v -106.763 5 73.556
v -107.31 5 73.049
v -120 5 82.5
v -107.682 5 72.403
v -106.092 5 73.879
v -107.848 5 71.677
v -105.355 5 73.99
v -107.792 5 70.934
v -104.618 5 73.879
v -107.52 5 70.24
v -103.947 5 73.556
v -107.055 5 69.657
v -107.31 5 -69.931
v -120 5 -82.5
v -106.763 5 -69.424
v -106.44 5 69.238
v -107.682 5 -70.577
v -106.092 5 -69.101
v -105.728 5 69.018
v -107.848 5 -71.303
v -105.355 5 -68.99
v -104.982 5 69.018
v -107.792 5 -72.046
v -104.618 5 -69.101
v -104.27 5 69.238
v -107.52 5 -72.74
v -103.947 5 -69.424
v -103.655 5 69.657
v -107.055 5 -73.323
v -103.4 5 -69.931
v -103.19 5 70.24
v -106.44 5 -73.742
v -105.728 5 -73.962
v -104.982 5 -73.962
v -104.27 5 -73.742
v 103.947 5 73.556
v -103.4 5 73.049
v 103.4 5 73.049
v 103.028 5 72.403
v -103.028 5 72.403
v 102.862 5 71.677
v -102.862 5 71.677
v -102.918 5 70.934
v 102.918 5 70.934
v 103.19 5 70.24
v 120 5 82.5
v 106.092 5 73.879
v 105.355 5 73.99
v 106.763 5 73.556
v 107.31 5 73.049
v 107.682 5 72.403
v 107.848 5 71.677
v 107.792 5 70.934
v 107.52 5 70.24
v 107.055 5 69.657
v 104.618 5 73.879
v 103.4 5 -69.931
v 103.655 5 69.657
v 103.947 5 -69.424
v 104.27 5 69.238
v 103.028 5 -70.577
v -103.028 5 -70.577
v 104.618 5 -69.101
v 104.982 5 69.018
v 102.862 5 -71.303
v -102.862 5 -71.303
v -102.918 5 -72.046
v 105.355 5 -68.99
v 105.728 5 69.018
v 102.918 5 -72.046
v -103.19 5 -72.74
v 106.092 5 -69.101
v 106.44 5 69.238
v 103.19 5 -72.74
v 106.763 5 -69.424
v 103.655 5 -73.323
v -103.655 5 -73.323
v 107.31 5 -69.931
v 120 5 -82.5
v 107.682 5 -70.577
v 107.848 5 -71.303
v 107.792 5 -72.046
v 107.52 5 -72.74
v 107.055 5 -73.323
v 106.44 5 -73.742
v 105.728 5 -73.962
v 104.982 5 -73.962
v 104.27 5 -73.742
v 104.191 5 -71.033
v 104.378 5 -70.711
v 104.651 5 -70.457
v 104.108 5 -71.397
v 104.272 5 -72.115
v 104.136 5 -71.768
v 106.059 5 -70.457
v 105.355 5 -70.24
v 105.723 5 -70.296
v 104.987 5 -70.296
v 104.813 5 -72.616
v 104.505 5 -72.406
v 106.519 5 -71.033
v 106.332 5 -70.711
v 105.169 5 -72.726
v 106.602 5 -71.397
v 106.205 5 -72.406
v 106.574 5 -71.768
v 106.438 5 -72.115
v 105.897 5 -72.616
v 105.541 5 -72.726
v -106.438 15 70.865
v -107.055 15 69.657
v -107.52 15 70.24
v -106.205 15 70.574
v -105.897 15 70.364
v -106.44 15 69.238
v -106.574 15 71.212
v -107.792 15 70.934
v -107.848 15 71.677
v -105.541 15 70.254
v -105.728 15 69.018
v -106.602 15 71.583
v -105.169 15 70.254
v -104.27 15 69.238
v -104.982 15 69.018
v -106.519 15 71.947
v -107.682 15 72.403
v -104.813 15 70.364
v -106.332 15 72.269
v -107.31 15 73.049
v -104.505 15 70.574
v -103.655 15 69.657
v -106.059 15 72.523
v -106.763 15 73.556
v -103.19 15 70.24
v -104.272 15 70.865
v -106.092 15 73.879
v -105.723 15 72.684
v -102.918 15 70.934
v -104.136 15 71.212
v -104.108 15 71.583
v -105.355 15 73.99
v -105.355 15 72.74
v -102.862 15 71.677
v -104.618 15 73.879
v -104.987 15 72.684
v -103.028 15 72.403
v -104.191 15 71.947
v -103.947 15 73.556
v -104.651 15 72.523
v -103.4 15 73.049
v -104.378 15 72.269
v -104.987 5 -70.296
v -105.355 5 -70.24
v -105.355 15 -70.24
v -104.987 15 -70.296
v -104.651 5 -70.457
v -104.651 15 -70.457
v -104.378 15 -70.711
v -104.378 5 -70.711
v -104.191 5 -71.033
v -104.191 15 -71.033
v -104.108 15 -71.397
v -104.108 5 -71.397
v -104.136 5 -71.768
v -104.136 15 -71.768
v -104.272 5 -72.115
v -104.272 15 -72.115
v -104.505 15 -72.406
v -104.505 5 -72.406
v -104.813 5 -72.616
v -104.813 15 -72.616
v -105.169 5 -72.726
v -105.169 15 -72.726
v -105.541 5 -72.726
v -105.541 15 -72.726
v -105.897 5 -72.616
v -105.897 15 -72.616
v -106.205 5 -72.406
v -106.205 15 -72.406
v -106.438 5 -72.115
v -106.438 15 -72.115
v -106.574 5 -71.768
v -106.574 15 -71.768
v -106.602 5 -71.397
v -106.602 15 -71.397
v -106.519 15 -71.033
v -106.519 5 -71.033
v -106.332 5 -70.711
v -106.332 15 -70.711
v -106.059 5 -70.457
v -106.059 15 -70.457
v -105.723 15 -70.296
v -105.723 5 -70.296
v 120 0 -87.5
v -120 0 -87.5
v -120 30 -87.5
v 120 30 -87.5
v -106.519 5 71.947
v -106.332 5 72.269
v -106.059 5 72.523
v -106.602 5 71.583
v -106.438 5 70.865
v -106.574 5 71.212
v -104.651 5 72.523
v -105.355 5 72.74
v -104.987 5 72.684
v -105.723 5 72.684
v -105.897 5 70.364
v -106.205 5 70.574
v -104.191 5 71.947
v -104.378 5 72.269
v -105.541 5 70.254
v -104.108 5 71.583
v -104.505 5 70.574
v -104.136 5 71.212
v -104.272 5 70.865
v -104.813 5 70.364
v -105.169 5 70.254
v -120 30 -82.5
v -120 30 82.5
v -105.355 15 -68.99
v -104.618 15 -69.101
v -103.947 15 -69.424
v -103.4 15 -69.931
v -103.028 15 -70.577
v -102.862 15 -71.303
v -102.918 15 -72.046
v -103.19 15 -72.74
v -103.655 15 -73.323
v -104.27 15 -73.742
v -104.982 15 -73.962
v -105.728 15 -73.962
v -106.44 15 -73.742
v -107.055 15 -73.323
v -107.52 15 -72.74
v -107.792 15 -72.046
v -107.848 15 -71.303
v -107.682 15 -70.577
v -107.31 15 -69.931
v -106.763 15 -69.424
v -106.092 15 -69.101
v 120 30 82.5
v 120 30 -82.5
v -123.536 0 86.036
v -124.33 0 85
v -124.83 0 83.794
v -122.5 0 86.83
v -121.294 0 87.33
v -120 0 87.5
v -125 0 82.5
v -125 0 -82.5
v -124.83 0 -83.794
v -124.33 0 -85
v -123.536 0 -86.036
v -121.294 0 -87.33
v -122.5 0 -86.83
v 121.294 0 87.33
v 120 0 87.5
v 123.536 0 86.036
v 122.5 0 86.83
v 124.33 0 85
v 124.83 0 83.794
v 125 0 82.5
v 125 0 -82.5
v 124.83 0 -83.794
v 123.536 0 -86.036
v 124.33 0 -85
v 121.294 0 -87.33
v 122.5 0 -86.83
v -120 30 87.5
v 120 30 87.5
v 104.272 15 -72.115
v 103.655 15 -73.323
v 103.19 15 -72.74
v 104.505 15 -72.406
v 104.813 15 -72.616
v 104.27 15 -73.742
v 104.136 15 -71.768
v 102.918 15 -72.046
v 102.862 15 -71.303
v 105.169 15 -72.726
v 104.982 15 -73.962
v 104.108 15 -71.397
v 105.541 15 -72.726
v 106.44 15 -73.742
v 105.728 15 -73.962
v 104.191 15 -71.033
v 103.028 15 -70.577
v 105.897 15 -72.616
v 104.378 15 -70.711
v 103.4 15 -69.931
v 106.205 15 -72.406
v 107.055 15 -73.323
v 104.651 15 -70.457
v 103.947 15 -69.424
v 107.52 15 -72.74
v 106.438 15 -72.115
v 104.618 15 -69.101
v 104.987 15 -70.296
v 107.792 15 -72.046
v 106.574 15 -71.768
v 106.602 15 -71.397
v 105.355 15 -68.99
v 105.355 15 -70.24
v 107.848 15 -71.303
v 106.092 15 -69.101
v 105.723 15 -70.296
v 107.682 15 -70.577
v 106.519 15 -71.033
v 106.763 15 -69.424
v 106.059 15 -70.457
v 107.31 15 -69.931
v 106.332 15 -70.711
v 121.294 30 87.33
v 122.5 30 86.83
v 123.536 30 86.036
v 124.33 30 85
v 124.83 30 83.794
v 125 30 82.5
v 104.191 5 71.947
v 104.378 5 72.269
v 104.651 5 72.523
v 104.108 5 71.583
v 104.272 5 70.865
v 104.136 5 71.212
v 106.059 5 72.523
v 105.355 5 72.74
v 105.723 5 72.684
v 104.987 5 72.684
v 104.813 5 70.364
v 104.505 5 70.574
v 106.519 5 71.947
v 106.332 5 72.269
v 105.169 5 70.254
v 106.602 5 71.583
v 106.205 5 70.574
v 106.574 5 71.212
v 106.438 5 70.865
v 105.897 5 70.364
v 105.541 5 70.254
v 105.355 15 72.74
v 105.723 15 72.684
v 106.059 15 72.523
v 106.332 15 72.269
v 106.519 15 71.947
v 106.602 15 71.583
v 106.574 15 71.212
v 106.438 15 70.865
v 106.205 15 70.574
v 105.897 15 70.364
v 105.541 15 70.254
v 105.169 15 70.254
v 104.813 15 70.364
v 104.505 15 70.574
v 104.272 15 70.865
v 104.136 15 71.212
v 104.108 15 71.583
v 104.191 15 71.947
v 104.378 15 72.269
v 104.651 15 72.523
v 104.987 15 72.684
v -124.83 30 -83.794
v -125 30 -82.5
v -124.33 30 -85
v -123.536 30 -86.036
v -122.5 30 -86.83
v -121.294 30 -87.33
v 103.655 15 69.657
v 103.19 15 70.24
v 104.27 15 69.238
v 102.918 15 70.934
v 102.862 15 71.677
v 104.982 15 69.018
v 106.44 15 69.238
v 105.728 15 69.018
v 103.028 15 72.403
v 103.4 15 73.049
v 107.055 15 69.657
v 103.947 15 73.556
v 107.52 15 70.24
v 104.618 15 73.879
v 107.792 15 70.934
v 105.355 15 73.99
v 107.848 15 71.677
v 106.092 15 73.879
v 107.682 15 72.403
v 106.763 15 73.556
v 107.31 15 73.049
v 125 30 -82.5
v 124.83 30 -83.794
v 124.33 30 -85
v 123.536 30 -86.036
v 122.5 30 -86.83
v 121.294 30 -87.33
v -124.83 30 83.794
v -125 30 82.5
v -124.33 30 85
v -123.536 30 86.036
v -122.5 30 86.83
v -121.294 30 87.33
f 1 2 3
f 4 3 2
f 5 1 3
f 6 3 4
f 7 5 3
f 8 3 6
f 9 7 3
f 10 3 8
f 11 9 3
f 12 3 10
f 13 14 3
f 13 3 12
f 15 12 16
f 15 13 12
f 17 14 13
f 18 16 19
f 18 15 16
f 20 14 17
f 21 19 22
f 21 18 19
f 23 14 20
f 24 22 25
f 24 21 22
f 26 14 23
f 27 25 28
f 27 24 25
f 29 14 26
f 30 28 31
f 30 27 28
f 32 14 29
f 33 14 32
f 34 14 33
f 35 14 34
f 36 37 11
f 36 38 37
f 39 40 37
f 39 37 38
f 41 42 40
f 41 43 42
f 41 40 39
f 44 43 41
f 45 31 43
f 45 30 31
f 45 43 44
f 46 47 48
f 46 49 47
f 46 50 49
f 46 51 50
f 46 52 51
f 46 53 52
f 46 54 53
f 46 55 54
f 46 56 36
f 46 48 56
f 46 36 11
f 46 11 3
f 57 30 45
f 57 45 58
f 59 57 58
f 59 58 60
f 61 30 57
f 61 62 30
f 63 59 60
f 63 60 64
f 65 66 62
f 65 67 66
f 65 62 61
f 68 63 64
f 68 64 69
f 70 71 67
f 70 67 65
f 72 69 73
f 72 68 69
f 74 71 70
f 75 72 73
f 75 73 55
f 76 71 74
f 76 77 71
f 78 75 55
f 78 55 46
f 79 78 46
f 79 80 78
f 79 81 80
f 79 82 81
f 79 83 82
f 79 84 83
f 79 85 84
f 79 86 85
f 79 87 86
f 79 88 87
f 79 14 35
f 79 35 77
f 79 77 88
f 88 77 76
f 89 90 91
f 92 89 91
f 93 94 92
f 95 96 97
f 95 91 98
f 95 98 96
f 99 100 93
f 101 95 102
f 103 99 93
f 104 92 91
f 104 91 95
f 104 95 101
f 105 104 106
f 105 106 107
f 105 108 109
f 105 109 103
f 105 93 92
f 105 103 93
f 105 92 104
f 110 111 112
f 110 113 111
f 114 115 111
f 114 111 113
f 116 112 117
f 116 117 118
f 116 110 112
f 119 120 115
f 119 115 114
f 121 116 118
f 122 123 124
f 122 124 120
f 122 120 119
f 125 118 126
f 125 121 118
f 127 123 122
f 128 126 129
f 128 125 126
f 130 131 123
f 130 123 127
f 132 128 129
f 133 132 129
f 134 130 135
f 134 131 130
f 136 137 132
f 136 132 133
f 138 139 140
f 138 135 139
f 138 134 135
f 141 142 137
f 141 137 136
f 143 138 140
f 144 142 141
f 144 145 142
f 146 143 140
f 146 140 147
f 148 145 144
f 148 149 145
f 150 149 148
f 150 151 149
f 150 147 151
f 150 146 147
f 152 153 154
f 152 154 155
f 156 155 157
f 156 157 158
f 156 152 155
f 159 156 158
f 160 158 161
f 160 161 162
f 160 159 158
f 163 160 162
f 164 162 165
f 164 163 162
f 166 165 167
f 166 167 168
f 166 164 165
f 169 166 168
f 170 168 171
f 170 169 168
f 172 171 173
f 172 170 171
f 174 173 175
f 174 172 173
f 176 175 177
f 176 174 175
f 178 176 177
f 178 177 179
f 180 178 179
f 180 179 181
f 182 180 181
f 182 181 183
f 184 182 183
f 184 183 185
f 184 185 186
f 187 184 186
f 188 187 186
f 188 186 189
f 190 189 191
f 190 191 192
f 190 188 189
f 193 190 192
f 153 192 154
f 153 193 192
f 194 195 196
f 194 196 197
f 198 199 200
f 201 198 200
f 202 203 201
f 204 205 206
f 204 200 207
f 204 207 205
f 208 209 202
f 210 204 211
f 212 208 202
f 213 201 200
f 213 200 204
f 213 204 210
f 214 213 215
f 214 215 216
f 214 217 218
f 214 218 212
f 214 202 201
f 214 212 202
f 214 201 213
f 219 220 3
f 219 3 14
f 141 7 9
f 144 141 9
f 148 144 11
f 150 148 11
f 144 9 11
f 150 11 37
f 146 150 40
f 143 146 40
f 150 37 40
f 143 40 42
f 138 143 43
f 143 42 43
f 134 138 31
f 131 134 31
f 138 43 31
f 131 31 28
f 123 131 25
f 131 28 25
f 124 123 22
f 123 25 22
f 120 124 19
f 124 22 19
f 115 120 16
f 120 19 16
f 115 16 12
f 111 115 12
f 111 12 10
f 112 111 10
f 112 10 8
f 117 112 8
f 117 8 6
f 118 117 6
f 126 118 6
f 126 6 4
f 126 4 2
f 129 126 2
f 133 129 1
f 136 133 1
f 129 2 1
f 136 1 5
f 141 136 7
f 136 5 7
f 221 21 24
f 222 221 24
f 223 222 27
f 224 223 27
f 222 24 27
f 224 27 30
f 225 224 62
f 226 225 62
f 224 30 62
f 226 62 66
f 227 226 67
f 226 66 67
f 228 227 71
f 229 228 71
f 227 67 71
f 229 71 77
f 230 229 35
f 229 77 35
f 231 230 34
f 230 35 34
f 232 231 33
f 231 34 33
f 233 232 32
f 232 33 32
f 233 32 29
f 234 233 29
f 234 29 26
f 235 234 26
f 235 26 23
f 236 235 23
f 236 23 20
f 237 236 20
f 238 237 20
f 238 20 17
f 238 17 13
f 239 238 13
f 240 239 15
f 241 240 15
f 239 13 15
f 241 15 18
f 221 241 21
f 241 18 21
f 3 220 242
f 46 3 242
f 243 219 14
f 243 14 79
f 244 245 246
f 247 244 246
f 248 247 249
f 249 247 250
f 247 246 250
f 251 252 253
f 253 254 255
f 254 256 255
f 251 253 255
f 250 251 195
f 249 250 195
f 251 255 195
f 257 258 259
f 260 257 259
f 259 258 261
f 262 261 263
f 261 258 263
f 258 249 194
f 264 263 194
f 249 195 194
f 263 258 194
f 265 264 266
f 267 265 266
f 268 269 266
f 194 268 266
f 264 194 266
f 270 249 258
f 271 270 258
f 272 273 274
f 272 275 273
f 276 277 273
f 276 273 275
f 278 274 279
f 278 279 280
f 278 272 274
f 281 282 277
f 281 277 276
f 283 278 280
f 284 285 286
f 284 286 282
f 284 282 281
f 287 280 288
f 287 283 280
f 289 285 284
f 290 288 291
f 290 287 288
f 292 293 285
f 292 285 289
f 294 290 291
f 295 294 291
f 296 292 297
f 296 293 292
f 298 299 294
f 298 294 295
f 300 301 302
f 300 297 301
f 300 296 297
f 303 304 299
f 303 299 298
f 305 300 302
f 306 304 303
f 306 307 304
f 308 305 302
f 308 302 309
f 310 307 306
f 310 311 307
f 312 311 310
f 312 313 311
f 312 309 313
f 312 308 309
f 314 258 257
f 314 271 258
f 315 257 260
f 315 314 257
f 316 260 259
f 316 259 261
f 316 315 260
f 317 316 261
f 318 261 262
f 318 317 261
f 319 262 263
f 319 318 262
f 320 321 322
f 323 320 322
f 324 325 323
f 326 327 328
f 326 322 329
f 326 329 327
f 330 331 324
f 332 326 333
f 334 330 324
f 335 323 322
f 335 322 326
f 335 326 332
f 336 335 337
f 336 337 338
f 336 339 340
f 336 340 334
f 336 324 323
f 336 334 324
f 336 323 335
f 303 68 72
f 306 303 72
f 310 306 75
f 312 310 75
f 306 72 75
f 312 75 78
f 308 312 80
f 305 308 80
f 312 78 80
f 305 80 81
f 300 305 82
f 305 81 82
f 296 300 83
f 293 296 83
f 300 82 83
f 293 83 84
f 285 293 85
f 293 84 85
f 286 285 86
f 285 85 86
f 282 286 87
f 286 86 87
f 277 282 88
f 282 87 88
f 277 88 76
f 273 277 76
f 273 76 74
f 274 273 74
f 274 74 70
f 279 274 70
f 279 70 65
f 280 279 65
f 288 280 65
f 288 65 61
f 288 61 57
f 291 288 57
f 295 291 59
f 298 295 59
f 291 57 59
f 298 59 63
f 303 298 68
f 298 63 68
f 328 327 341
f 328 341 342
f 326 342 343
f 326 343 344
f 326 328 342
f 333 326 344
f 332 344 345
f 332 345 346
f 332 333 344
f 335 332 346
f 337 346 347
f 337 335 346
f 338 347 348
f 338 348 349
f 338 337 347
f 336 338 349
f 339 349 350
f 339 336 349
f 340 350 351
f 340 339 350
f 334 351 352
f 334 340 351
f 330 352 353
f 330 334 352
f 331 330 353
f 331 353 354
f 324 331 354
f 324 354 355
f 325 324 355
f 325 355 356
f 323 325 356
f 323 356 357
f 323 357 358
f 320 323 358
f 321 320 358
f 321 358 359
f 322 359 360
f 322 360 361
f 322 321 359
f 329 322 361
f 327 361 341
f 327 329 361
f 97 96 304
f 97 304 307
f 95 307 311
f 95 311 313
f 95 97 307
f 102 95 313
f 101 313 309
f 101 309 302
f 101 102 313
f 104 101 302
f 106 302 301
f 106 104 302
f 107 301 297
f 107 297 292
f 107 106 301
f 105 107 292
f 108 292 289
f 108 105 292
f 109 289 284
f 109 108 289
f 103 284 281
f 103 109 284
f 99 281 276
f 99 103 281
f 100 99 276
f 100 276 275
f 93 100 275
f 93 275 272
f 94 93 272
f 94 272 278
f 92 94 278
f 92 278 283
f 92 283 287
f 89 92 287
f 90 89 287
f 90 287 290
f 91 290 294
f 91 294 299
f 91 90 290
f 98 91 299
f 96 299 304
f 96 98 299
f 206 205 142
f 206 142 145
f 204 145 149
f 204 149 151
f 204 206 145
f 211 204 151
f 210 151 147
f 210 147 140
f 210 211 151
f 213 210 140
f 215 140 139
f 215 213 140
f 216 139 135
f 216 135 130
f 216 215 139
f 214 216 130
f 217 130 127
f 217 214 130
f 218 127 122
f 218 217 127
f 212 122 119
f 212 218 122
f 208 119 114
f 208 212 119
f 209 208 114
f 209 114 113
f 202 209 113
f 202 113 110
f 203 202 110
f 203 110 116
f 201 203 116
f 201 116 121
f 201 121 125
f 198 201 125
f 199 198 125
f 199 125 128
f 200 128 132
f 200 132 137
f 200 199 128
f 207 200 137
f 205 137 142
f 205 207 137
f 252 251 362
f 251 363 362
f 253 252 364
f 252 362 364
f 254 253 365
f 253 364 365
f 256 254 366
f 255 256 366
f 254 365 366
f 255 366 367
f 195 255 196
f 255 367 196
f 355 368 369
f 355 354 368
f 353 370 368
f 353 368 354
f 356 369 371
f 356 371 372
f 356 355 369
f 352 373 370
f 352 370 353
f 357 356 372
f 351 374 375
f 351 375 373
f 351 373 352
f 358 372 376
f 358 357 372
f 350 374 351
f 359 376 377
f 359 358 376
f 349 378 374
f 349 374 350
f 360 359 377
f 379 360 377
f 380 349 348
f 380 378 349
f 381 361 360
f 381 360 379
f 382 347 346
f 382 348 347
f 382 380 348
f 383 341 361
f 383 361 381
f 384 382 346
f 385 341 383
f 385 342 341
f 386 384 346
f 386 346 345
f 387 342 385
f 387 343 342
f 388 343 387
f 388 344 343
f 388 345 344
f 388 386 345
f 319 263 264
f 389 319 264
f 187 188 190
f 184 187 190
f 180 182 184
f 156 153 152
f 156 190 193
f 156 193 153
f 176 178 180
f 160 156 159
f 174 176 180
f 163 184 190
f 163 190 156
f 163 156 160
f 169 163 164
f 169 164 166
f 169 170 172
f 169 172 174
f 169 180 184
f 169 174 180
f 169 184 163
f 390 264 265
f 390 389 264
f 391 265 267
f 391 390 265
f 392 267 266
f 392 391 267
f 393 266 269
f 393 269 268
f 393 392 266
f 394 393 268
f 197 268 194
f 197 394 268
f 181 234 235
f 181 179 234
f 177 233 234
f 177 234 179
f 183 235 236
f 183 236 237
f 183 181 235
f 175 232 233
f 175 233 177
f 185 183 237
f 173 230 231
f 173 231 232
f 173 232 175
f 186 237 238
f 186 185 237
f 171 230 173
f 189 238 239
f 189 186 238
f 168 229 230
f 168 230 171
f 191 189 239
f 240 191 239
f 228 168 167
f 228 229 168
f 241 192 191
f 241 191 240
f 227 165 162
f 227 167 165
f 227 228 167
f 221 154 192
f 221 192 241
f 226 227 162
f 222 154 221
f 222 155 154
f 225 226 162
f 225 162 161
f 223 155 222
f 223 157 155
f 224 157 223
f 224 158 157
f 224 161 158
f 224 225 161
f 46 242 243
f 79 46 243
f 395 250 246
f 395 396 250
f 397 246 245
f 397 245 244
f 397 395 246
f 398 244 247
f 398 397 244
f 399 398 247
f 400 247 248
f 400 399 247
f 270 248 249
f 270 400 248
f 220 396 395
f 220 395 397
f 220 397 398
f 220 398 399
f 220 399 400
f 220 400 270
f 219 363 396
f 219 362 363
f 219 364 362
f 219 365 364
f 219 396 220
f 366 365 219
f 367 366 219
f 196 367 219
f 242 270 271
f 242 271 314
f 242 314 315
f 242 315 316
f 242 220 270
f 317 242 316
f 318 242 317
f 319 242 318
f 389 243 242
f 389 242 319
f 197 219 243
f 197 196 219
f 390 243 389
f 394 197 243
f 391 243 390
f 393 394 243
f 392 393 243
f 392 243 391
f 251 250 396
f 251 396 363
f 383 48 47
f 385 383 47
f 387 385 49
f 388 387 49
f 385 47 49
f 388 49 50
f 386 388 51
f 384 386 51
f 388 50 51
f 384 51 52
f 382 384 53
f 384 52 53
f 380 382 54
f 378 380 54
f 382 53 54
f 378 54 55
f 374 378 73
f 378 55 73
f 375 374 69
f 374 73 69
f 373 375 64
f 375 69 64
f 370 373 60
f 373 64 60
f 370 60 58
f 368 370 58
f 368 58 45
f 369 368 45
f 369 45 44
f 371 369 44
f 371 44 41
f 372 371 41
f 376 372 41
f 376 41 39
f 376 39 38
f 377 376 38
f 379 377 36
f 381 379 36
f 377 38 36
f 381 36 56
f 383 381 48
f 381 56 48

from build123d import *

# Parameters (mm, degrees)
SKETCH1_W           = 250
SKETCH1_H           = 175
BOSS_EXTRUDE1_DEPTH = 30
FILLET1_R           = 5
SKETCH3_W           = 240
SKETCH3_H           = 165
CUT_EXTRUDE1_DEPTH  = 25
SKETCH4_R           = 2.5
SKETCH4_R_2         = 1.25
BOSS_EXTRUDE2_DEPTH = 10


with BuildPart() as part:
    # Sketch1 → Boss-Extrude1 (new body)
    with BuildSketch(Plane(origin=(0, 0, 0), x_dir=(1, 0, 0), z_dir=(0, 1, 0))):
        Rectangle(SKETCH1_W, SKETCH1_H)
    extrude(amount=BOSS_EXTRUDE1_DEPTH)

    # Fillet1
    fillet1_edges = [part.edges().sort_by_distance(p)[0] for p in [
        (125, 15, 87.5),
        (-125, 15, 87.5),
        (-125, 15, -87.5),
        (125, 15, -87.5),
    ]]
    fillet(fillet1_edges, radius=FILLET1_R)

    # Sketch3 → Cut-Extrude1 (cut)
    with BuildSketch(Plane(origin=(0, 30, 0), x_dir=(1, 0, 0), z_dir=(0, 1, 0))):
        Rectangle(SKETCH3_W, SKETCH3_H)
    extrude(amount=-CUT_EXTRUDE1_DEPTH, mode=Mode.SUBTRACT)

    # Sketch4 → Boss-Extrude2 (add)
    # profile 1 of 4: a face of its own
    with BuildSketch(Plane(origin=(0, 5, 0), x_dir=(1, 0, 0), z_dir=(0, 1, 0))):
        with Locations(Location((-105.355, 71.49, 0), (0, 0, 270))):
            Circle(SKETCH4_R)
        with Locations(Location((-105.355, 71.49, 0), (0, 0, 270))):
            Circle(SKETCH4_R_2, mode=Mode.SUBTRACT)
    # profile 2 of 4: a face of its own
    with BuildSketch(Plane(origin=(0, 5, 0), x_dir=(1, 0, 0), z_dir=(0, 1, 0))):
        with Locations(Location((105.355, 71.49, 0), (0, 0, 270))):
            Circle(SKETCH4_R)
        with Locations(Location((105.355, 71.49, 0), (0, 0, 270))):
            Circle(SKETCH4_R_2, mode=Mode.SUBTRACT)
    # profile 3 of 4: a face of its own
    with BuildSketch(Plane(origin=(0, 5, 0), x_dir=(1, 0, 0), z_dir=(0, 1, 0))):
        with Locations(Location((105.355, -71.49, 0), (0, 0, 270))):
            Circle(SKETCH4_R)
        with Locations(Location((105.355, -71.49, 0), (0, 0, 270))):
            Circle(SKETCH4_R_2, mode=Mode.SUBTRACT)
    # profile 4 of 4: a face of its own
    with BuildSketch(Plane(origin=(0, 5, 0), x_dir=(1, 0, 0), z_dir=(0, 1, 0))):
        with Locations(Location((-105.355, -71.49, 0), (0, 0, 270))):
            Circle(SKETCH4_R)
        with Locations(Location((-105.355, -71.49, 0), (0, 0, 270))):
            Circle(SKETCH4_R_2, mode=Mode.SUBTRACT)
    extrude(amount=BOSS_EXTRUDE2_DEPTH)


solid = part.part
